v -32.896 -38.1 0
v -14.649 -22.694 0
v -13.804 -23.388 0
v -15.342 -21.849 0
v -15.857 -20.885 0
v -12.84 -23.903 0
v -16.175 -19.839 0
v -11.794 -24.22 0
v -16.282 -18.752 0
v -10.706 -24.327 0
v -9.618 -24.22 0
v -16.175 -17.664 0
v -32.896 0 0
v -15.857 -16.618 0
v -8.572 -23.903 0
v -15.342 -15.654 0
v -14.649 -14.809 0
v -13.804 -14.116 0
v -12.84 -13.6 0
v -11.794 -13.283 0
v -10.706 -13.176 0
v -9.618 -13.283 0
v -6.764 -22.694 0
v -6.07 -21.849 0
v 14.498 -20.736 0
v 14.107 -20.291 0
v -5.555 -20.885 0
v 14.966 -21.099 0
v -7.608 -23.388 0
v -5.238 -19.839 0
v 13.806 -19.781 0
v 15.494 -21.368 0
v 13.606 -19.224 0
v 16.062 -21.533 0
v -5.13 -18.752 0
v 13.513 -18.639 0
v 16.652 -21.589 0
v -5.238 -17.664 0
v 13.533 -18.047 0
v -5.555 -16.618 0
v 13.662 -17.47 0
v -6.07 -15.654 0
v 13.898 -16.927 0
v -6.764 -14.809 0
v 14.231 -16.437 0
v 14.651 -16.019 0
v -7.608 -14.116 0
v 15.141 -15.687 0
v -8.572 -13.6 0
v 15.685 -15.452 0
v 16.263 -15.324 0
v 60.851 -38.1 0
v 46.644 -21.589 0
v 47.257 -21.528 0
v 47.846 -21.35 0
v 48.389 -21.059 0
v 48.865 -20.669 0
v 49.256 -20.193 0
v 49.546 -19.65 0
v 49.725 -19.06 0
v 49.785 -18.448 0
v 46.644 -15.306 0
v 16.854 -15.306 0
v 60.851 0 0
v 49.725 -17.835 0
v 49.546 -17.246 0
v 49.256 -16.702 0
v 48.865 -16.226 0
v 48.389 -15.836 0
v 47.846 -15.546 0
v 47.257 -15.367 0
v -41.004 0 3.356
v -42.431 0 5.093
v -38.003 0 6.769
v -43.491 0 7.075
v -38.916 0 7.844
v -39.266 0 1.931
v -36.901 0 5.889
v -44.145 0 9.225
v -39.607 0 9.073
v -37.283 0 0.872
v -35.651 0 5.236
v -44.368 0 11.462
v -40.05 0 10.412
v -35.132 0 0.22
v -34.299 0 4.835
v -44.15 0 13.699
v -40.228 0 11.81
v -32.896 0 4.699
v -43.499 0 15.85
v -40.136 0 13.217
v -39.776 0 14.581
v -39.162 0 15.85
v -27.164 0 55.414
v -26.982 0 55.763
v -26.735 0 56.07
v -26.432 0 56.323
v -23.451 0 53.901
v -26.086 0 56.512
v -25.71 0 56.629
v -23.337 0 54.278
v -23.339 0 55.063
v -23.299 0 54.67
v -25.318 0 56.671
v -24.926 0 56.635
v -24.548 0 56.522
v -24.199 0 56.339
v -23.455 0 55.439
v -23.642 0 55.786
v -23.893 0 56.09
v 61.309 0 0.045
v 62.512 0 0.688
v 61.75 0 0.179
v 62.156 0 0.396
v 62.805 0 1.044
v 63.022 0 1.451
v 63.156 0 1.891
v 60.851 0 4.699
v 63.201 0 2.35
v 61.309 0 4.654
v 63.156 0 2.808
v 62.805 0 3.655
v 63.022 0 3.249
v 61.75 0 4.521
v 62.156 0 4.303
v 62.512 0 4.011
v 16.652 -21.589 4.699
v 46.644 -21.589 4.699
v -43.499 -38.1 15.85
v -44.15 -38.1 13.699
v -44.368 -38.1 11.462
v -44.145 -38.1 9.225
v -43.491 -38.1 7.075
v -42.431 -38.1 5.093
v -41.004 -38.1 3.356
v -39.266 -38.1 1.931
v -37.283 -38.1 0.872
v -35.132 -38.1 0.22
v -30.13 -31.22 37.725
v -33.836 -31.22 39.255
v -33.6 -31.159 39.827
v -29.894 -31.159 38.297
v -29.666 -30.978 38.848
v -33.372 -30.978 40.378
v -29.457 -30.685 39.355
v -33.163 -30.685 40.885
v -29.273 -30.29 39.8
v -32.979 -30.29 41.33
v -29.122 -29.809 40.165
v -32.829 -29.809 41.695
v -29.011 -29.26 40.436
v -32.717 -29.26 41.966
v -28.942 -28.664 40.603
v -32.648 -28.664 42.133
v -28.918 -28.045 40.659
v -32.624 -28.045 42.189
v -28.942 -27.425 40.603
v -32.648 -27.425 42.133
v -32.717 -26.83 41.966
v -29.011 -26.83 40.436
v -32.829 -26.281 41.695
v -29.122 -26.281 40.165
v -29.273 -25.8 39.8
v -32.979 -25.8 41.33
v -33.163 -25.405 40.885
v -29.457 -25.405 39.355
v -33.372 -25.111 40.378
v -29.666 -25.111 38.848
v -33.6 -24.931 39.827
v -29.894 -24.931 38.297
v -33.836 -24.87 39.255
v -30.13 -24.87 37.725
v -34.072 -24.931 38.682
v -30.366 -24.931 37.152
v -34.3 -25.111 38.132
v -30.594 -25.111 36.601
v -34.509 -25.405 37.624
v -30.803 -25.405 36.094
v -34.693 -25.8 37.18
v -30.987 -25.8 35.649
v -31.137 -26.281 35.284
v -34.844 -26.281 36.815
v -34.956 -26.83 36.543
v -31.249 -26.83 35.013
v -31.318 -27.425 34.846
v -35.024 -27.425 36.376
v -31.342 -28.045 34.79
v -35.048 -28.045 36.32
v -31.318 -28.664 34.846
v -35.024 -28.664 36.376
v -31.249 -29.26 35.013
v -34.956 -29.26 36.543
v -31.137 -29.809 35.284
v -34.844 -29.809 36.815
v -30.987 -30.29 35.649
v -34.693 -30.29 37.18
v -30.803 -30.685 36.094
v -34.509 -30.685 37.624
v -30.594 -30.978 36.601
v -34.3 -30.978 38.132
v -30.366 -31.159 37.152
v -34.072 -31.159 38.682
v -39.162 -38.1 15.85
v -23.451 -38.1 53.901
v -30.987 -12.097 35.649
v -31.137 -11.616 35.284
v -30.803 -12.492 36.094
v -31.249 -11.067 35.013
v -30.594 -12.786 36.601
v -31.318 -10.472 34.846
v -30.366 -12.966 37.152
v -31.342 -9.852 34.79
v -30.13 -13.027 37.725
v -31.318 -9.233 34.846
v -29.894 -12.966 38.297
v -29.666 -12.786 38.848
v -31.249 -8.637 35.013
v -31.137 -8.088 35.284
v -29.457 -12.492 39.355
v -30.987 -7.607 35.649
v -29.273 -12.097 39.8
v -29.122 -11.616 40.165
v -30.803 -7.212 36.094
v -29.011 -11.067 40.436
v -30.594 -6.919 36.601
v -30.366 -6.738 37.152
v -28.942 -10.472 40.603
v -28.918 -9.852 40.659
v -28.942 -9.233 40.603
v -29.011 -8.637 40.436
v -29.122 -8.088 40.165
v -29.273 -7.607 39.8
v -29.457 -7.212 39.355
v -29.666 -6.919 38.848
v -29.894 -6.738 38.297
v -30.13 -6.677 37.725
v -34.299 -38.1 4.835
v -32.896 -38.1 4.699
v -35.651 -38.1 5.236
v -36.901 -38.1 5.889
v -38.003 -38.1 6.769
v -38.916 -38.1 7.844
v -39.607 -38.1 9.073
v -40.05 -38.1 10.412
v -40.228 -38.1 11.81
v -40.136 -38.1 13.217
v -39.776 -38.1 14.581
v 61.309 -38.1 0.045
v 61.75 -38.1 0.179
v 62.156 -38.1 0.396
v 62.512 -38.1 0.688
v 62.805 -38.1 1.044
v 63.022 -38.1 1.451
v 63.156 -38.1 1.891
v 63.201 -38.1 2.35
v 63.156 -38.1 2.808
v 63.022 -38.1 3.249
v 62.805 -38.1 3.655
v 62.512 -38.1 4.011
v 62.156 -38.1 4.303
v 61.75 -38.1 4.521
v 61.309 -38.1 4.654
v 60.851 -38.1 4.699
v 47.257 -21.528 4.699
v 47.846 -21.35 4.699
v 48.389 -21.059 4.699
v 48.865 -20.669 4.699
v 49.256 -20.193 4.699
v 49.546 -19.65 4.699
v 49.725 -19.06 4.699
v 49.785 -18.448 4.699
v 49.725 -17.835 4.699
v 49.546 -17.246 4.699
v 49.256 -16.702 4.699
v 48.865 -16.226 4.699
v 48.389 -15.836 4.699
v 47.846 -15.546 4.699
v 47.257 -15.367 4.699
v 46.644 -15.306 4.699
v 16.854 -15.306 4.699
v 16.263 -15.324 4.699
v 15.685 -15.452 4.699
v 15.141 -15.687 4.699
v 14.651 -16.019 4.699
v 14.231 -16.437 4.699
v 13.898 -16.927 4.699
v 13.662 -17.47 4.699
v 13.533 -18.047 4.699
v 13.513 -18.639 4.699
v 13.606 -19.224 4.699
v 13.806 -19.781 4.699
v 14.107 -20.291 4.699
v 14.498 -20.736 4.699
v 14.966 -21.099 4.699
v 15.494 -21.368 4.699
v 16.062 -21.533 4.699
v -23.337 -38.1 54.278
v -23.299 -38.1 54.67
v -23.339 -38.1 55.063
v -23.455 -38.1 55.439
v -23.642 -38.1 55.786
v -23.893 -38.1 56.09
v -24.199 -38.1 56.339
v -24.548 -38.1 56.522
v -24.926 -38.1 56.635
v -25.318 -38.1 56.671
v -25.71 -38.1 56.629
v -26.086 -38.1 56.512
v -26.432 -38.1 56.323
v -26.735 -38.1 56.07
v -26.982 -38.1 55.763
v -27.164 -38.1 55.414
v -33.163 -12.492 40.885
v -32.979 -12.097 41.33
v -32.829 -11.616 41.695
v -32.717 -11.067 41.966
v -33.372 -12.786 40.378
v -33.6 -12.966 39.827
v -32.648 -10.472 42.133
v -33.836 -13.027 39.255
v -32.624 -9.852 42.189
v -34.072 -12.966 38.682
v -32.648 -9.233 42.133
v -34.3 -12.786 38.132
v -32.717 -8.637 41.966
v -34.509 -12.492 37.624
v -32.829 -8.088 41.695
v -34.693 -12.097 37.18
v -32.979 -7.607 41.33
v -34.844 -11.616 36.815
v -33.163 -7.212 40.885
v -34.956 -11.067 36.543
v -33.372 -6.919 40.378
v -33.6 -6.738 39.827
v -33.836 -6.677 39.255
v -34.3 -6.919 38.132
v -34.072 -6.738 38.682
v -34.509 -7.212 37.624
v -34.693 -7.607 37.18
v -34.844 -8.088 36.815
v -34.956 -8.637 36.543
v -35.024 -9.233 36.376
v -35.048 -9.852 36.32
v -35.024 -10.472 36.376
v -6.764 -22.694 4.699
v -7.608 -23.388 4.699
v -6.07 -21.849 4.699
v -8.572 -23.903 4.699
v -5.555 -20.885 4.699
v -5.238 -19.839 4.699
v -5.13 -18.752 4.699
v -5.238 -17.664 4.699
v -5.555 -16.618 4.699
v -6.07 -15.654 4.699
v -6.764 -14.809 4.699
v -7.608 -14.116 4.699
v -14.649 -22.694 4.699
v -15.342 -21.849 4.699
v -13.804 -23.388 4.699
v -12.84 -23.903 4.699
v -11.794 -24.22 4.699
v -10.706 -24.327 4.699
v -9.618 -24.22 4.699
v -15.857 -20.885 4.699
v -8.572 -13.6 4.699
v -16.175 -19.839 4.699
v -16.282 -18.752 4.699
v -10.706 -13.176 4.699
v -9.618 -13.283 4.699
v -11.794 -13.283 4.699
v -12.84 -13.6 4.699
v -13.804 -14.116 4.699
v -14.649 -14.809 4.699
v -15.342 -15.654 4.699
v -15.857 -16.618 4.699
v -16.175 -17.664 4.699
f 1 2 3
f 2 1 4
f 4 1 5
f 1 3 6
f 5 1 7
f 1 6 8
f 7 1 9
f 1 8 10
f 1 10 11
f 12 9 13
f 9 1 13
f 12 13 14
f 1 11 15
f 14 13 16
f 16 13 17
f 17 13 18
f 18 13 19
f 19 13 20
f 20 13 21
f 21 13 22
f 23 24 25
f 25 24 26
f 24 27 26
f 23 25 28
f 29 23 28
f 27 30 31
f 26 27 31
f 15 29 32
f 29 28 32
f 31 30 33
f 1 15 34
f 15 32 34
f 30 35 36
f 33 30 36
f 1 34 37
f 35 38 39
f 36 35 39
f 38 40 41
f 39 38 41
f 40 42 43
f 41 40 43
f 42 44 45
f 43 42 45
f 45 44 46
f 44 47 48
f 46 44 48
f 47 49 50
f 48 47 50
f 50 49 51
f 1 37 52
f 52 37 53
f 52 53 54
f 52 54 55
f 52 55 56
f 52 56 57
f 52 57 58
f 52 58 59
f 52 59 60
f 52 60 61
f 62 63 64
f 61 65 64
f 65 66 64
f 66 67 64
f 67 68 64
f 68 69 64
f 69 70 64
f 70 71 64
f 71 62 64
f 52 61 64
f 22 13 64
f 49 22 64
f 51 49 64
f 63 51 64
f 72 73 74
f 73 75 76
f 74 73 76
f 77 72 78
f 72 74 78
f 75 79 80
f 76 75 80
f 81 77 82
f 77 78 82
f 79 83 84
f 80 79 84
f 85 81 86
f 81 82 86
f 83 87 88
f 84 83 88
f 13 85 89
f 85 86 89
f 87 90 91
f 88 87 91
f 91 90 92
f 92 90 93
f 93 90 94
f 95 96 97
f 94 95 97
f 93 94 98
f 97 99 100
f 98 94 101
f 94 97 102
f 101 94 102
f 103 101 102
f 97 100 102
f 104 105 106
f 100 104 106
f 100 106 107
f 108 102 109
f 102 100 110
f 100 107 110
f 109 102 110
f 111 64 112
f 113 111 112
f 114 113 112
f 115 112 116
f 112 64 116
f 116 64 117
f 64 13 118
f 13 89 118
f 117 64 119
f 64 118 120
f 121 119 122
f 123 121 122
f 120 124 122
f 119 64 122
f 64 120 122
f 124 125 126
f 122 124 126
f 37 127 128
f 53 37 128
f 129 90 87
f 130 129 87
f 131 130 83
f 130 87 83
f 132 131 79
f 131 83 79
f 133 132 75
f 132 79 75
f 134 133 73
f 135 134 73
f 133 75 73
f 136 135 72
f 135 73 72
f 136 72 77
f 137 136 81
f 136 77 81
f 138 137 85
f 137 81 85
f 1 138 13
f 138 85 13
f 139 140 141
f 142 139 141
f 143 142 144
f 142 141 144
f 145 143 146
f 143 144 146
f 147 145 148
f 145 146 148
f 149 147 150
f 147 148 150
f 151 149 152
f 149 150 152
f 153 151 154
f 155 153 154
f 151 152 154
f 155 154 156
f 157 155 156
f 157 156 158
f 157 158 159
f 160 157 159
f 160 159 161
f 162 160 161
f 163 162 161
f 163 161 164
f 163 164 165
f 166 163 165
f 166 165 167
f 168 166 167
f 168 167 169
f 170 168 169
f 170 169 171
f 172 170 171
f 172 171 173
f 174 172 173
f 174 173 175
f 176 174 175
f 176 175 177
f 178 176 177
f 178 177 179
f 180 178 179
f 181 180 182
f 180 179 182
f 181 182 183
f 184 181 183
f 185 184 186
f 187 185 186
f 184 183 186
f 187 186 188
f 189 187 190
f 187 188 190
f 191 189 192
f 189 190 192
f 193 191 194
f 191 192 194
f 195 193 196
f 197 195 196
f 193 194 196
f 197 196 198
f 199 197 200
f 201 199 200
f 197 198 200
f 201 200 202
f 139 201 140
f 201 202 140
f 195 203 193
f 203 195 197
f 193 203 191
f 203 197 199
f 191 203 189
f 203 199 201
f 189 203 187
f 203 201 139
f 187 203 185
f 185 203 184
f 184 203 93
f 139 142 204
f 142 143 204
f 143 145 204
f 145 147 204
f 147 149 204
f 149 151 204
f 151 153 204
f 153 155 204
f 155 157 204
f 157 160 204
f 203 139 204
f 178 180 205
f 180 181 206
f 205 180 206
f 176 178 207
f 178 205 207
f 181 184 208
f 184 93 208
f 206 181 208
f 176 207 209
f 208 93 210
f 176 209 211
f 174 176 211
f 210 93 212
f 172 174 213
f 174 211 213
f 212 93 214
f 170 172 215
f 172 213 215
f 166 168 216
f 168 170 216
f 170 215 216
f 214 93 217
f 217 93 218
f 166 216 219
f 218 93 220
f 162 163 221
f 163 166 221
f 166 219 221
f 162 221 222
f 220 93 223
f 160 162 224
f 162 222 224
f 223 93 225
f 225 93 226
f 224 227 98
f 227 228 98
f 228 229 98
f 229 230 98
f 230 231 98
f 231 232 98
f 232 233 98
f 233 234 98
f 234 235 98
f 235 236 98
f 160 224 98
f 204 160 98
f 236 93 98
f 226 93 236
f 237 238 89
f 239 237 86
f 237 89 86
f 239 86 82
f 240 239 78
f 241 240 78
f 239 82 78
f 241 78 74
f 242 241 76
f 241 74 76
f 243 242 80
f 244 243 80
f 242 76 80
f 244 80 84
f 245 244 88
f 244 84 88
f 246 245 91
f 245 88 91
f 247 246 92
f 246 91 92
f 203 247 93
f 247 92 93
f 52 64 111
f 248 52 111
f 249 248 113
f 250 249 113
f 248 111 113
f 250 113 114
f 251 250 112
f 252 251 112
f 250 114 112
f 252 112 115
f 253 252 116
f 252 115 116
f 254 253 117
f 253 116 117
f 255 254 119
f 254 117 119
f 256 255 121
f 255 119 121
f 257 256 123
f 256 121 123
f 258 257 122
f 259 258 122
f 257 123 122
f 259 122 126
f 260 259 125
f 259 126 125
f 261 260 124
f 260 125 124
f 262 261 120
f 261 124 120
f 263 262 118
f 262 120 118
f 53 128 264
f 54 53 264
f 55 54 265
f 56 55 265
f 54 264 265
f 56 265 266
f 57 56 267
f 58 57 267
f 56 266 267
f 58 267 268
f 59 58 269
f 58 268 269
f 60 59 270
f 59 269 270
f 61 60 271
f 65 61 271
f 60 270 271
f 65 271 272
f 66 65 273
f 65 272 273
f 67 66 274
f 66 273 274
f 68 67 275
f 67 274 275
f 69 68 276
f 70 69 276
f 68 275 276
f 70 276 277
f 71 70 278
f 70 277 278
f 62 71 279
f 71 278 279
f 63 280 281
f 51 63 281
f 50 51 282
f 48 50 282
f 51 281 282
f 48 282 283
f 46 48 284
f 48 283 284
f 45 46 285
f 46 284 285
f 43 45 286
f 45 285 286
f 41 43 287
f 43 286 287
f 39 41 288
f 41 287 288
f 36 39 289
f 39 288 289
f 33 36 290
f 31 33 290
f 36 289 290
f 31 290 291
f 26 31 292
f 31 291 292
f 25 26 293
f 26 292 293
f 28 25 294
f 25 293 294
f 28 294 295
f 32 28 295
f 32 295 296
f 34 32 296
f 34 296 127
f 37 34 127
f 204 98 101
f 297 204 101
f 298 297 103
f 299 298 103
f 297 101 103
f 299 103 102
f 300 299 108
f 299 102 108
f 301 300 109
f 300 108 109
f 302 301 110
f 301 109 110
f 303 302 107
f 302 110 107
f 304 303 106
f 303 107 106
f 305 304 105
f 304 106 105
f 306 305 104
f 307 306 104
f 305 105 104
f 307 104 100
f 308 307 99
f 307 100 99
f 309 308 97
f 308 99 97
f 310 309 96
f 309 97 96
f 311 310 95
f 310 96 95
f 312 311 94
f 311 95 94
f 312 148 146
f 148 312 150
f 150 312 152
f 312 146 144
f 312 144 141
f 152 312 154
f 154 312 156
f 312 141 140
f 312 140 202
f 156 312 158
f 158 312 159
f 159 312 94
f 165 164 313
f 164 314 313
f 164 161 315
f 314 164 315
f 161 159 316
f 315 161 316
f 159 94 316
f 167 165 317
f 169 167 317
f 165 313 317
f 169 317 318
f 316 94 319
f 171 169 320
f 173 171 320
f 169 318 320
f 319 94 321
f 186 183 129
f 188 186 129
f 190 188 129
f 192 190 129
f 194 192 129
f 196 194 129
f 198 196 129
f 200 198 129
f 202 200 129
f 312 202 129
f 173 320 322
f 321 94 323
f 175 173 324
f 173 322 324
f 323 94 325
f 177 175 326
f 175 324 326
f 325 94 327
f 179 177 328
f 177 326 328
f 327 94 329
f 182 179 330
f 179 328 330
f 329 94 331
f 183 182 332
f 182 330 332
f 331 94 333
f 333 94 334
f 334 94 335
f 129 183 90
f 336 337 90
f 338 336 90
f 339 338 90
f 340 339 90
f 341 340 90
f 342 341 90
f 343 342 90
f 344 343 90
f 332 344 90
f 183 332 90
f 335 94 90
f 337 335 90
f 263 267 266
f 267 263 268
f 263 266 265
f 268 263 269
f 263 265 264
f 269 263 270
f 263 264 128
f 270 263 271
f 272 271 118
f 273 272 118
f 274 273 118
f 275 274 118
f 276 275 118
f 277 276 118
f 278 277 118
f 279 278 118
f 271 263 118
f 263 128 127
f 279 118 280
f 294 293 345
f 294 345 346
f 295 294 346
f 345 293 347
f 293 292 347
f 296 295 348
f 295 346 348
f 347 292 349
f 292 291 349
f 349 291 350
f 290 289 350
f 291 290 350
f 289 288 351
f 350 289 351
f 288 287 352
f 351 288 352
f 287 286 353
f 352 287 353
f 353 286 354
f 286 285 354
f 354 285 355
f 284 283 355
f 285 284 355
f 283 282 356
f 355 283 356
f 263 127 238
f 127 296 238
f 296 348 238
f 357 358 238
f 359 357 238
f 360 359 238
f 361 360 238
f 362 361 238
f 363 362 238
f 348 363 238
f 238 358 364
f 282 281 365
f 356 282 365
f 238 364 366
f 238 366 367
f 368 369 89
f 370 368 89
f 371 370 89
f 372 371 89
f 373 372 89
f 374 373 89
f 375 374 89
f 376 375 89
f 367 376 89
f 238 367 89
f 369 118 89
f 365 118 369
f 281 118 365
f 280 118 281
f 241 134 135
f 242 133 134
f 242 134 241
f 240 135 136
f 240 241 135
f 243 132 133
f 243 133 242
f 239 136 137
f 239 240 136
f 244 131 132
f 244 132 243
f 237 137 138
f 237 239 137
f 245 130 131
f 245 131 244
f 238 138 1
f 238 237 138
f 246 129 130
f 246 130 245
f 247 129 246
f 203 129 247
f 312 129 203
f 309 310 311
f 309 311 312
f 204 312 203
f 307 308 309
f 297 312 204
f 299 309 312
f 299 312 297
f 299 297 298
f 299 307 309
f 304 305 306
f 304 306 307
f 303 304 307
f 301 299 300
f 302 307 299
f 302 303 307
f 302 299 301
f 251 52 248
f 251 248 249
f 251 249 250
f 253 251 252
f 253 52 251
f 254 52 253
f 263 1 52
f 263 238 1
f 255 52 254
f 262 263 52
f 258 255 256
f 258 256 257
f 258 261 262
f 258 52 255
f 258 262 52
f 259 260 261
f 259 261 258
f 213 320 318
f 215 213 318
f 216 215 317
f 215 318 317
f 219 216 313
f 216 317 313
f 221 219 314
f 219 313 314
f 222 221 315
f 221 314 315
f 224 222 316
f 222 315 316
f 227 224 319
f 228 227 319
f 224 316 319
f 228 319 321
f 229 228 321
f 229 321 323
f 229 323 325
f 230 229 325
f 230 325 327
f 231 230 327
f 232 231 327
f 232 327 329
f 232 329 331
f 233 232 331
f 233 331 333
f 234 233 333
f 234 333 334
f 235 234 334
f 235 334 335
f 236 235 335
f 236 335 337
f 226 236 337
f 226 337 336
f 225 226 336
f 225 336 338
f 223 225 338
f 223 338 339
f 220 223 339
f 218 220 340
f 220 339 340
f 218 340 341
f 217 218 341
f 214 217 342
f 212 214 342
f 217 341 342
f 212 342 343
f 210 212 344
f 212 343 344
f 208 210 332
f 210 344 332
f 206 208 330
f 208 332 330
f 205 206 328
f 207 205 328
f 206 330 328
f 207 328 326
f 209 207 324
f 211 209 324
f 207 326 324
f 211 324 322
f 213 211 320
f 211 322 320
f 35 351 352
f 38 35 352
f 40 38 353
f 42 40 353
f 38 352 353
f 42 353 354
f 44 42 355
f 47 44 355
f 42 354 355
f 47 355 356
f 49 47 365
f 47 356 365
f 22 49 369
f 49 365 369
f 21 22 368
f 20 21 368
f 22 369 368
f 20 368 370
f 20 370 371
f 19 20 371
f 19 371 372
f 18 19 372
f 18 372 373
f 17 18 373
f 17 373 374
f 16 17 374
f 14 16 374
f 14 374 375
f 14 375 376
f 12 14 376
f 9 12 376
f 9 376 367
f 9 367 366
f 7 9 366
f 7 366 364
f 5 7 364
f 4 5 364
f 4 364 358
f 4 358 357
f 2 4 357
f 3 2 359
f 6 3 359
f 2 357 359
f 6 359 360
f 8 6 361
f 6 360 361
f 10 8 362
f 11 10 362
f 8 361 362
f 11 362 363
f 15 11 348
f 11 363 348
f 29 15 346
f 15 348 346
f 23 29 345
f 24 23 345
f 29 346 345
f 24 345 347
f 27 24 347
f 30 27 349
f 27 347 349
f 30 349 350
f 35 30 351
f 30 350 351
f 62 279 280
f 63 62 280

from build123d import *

# Parameters (mm, degrees)
F1_DEPTH = 38.1
F2_R     = 5.5756630796
F3_DEPTH = 25.4
F4_R     = 3.175
F5_DEPTH = 25.4


with BuildPart() as f1:
    # F0 (on Front) → F1 (new body)
    with BuildSketch(Plane.XZ):
        with BuildLine():
            Line((-32.8956767917, 0), (60.8509816229, 0))
            ThreePointArc((60.8509816229, 0), (63.2006728556, 2.3496912327), (60.8509816229, 4.6993824653))
            Line((60.8509816229, 4.6993824653), (-32.8956767917, 4.6993824653))
            ThreePointArc((-32.8956767917, 4.6993824653), (-39.2909683128, 8.4415319313), (-39.1615219414, 15.8500864396))
            Line((-39.1615219414, 15.8500864396), (-23.4511158537, 53.9007586853))
            ThreePointArc((-23.4511158537, 53.9007586853), (-24.5476949895, 56.5224848042), (-27.1643130178, 55.4137721553))
            Line((-27.1643130178, 55.4137721553), (-43.4994138777, 15.8500864396))
            ThreePointArc((-43.4994138777, 15.8500864396), (-42.43067129, 5.0930741417), (-32.8956767917, 0))
        make_face()
    extrude(amount=F1_DEPTH)

    # F2 (on face) → F3 (cut)
    with BuildSketch(Plane.XY.offset(4.6993824653)):
        with Locations((-10.7061062008, -18.751559779)):
            Circle(F2_R)
        with BuildLine():
            Line((46.6441214085, -15.3064941987), (16.8544258922, -15.3064941987))
            ThreePointArc((16.8544258922, -15.3064941987), (13.5090501422, -18.3429366679), (16.6517738253, -21.5886738151))
            Line((16.6517738253, -21.5886738151), (46.6441214085, -21.5886738151))
            ThreePointArc((46.6441214085, -21.5886738151), (49.7852112167, -18.4475840069), (46.6441214085, -15.3064941987))
        make_face()
    extrude(amount=-F3_DEPTH, mode=Mode.SUBTRACT)

    # F4 (on face) → F5 (cut)
    with BuildSketch(Plane(origin=(-42.7551148795, 0, 17.6527818681), x_dir=(0, -1, 0), z_dir=(-0.9243143528, 0, 0.3816319917))):
        with Locations((9.8523907273, 23.3707670122)):
            Circle(F4_R)
        with Locations((28.044729707, 23.3707670122)):
            Circle(F4_R)
    extrude(amount=-F5_DEPTH, mode=Mode.SUBTRACT)


solid = f1.part
